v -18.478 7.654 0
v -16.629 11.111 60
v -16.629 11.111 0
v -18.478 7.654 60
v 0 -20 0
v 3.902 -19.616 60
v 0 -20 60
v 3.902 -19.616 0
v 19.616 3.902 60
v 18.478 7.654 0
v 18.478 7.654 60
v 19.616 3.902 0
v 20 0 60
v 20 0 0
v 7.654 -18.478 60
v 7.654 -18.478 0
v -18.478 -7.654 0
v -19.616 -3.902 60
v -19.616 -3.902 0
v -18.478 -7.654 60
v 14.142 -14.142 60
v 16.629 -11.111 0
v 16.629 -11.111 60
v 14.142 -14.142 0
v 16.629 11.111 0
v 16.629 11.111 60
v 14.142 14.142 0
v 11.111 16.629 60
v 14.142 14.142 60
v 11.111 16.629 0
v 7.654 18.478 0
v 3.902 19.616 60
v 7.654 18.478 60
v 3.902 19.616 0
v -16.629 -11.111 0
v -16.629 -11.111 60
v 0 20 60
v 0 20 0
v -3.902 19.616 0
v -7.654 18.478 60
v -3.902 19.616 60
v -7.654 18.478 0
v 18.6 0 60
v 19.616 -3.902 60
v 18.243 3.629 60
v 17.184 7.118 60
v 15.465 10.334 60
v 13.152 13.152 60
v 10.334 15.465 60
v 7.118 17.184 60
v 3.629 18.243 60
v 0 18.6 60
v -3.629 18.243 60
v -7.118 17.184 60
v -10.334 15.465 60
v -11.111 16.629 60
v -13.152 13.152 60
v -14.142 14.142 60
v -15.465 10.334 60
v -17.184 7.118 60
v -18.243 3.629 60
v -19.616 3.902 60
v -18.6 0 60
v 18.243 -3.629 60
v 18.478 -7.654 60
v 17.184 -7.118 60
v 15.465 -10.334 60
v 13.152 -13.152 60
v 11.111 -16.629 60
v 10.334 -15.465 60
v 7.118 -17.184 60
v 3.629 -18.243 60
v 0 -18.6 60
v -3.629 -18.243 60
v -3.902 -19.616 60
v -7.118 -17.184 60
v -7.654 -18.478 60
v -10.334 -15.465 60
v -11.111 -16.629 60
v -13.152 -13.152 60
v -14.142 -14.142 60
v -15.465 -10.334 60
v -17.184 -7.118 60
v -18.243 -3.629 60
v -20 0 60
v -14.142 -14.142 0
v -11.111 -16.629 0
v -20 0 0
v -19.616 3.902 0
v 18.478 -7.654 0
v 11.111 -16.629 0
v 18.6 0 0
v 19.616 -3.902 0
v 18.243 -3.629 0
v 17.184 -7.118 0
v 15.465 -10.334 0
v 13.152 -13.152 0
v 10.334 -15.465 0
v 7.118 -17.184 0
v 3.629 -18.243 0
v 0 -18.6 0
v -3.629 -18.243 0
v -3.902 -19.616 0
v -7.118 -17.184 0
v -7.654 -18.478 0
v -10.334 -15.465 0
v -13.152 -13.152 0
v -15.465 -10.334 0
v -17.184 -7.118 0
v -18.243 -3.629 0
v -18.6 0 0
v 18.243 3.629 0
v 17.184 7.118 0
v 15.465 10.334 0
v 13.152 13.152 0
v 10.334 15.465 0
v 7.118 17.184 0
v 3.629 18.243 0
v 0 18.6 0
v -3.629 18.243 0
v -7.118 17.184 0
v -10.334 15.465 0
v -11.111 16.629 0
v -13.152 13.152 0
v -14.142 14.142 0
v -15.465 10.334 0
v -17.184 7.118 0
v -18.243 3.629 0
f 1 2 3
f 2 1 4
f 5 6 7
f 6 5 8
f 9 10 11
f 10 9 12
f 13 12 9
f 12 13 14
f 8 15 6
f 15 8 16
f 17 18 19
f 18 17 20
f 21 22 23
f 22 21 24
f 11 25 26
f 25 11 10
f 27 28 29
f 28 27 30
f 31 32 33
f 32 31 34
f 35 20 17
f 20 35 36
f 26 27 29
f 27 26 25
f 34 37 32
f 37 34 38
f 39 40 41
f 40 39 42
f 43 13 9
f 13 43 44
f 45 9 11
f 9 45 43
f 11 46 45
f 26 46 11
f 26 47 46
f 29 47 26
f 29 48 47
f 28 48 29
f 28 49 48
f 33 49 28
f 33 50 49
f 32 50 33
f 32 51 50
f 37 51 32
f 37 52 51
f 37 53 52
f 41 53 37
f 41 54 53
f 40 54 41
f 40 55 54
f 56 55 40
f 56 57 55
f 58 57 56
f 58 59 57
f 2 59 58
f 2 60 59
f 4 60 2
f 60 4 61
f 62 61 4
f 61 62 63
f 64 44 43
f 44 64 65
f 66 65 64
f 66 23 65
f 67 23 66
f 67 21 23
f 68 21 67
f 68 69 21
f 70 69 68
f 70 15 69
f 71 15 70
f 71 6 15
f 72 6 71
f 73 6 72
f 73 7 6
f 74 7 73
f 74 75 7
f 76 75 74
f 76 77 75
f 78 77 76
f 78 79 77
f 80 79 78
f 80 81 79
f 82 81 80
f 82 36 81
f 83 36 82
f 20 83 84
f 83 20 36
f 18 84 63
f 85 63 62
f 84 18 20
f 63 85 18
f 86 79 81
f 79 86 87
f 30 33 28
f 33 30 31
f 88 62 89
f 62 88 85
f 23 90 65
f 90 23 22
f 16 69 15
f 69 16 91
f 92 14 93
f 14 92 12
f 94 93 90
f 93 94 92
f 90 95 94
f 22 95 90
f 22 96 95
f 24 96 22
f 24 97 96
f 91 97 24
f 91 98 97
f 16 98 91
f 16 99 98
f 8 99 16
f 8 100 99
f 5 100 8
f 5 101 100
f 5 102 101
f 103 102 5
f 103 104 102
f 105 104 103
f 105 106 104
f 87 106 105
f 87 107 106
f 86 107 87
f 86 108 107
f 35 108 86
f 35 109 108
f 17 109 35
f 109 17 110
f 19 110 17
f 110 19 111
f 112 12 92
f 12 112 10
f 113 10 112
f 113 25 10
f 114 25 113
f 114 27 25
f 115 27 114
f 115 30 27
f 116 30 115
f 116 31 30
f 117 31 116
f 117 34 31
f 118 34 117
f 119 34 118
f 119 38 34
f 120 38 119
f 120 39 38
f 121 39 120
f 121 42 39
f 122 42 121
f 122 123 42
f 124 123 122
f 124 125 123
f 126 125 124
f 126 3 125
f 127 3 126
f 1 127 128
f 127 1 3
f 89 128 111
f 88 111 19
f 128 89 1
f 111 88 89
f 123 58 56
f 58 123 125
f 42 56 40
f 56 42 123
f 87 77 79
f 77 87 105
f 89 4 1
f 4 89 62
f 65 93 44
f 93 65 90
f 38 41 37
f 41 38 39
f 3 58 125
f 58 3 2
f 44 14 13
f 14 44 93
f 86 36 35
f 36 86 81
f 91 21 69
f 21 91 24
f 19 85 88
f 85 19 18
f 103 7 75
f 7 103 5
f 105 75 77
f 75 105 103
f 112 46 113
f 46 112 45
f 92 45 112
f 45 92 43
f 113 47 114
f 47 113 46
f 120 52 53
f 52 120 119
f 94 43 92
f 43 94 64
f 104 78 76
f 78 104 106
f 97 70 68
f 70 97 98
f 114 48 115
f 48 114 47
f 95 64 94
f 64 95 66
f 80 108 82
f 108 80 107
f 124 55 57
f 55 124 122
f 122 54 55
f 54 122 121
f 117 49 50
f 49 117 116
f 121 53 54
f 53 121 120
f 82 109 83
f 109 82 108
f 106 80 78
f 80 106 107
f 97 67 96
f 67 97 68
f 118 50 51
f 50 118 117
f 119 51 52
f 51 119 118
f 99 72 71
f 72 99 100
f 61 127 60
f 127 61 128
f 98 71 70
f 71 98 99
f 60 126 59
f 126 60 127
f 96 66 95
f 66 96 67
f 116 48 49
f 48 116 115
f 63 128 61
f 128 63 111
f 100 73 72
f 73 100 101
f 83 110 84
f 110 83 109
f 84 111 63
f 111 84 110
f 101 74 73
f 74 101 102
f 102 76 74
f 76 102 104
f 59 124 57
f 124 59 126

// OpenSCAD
$fn = 32;

// ----------------------------------------------------------------------
// Thin tube: 1.4 mm wall
// ----------------------------------------------------------------------

// --- parameters (mm) ---
tube_od = 40;             // outer diameter
tube_h = 60;              // height, Z
wall = 1.4;               // wall thickness

difference() {
  cylinder(h = tube_h, d = tube_od);
  translate([0, 0, -1]) cylinder(h = tube_h + 2, d = tube_od - 2 * wall);
}
